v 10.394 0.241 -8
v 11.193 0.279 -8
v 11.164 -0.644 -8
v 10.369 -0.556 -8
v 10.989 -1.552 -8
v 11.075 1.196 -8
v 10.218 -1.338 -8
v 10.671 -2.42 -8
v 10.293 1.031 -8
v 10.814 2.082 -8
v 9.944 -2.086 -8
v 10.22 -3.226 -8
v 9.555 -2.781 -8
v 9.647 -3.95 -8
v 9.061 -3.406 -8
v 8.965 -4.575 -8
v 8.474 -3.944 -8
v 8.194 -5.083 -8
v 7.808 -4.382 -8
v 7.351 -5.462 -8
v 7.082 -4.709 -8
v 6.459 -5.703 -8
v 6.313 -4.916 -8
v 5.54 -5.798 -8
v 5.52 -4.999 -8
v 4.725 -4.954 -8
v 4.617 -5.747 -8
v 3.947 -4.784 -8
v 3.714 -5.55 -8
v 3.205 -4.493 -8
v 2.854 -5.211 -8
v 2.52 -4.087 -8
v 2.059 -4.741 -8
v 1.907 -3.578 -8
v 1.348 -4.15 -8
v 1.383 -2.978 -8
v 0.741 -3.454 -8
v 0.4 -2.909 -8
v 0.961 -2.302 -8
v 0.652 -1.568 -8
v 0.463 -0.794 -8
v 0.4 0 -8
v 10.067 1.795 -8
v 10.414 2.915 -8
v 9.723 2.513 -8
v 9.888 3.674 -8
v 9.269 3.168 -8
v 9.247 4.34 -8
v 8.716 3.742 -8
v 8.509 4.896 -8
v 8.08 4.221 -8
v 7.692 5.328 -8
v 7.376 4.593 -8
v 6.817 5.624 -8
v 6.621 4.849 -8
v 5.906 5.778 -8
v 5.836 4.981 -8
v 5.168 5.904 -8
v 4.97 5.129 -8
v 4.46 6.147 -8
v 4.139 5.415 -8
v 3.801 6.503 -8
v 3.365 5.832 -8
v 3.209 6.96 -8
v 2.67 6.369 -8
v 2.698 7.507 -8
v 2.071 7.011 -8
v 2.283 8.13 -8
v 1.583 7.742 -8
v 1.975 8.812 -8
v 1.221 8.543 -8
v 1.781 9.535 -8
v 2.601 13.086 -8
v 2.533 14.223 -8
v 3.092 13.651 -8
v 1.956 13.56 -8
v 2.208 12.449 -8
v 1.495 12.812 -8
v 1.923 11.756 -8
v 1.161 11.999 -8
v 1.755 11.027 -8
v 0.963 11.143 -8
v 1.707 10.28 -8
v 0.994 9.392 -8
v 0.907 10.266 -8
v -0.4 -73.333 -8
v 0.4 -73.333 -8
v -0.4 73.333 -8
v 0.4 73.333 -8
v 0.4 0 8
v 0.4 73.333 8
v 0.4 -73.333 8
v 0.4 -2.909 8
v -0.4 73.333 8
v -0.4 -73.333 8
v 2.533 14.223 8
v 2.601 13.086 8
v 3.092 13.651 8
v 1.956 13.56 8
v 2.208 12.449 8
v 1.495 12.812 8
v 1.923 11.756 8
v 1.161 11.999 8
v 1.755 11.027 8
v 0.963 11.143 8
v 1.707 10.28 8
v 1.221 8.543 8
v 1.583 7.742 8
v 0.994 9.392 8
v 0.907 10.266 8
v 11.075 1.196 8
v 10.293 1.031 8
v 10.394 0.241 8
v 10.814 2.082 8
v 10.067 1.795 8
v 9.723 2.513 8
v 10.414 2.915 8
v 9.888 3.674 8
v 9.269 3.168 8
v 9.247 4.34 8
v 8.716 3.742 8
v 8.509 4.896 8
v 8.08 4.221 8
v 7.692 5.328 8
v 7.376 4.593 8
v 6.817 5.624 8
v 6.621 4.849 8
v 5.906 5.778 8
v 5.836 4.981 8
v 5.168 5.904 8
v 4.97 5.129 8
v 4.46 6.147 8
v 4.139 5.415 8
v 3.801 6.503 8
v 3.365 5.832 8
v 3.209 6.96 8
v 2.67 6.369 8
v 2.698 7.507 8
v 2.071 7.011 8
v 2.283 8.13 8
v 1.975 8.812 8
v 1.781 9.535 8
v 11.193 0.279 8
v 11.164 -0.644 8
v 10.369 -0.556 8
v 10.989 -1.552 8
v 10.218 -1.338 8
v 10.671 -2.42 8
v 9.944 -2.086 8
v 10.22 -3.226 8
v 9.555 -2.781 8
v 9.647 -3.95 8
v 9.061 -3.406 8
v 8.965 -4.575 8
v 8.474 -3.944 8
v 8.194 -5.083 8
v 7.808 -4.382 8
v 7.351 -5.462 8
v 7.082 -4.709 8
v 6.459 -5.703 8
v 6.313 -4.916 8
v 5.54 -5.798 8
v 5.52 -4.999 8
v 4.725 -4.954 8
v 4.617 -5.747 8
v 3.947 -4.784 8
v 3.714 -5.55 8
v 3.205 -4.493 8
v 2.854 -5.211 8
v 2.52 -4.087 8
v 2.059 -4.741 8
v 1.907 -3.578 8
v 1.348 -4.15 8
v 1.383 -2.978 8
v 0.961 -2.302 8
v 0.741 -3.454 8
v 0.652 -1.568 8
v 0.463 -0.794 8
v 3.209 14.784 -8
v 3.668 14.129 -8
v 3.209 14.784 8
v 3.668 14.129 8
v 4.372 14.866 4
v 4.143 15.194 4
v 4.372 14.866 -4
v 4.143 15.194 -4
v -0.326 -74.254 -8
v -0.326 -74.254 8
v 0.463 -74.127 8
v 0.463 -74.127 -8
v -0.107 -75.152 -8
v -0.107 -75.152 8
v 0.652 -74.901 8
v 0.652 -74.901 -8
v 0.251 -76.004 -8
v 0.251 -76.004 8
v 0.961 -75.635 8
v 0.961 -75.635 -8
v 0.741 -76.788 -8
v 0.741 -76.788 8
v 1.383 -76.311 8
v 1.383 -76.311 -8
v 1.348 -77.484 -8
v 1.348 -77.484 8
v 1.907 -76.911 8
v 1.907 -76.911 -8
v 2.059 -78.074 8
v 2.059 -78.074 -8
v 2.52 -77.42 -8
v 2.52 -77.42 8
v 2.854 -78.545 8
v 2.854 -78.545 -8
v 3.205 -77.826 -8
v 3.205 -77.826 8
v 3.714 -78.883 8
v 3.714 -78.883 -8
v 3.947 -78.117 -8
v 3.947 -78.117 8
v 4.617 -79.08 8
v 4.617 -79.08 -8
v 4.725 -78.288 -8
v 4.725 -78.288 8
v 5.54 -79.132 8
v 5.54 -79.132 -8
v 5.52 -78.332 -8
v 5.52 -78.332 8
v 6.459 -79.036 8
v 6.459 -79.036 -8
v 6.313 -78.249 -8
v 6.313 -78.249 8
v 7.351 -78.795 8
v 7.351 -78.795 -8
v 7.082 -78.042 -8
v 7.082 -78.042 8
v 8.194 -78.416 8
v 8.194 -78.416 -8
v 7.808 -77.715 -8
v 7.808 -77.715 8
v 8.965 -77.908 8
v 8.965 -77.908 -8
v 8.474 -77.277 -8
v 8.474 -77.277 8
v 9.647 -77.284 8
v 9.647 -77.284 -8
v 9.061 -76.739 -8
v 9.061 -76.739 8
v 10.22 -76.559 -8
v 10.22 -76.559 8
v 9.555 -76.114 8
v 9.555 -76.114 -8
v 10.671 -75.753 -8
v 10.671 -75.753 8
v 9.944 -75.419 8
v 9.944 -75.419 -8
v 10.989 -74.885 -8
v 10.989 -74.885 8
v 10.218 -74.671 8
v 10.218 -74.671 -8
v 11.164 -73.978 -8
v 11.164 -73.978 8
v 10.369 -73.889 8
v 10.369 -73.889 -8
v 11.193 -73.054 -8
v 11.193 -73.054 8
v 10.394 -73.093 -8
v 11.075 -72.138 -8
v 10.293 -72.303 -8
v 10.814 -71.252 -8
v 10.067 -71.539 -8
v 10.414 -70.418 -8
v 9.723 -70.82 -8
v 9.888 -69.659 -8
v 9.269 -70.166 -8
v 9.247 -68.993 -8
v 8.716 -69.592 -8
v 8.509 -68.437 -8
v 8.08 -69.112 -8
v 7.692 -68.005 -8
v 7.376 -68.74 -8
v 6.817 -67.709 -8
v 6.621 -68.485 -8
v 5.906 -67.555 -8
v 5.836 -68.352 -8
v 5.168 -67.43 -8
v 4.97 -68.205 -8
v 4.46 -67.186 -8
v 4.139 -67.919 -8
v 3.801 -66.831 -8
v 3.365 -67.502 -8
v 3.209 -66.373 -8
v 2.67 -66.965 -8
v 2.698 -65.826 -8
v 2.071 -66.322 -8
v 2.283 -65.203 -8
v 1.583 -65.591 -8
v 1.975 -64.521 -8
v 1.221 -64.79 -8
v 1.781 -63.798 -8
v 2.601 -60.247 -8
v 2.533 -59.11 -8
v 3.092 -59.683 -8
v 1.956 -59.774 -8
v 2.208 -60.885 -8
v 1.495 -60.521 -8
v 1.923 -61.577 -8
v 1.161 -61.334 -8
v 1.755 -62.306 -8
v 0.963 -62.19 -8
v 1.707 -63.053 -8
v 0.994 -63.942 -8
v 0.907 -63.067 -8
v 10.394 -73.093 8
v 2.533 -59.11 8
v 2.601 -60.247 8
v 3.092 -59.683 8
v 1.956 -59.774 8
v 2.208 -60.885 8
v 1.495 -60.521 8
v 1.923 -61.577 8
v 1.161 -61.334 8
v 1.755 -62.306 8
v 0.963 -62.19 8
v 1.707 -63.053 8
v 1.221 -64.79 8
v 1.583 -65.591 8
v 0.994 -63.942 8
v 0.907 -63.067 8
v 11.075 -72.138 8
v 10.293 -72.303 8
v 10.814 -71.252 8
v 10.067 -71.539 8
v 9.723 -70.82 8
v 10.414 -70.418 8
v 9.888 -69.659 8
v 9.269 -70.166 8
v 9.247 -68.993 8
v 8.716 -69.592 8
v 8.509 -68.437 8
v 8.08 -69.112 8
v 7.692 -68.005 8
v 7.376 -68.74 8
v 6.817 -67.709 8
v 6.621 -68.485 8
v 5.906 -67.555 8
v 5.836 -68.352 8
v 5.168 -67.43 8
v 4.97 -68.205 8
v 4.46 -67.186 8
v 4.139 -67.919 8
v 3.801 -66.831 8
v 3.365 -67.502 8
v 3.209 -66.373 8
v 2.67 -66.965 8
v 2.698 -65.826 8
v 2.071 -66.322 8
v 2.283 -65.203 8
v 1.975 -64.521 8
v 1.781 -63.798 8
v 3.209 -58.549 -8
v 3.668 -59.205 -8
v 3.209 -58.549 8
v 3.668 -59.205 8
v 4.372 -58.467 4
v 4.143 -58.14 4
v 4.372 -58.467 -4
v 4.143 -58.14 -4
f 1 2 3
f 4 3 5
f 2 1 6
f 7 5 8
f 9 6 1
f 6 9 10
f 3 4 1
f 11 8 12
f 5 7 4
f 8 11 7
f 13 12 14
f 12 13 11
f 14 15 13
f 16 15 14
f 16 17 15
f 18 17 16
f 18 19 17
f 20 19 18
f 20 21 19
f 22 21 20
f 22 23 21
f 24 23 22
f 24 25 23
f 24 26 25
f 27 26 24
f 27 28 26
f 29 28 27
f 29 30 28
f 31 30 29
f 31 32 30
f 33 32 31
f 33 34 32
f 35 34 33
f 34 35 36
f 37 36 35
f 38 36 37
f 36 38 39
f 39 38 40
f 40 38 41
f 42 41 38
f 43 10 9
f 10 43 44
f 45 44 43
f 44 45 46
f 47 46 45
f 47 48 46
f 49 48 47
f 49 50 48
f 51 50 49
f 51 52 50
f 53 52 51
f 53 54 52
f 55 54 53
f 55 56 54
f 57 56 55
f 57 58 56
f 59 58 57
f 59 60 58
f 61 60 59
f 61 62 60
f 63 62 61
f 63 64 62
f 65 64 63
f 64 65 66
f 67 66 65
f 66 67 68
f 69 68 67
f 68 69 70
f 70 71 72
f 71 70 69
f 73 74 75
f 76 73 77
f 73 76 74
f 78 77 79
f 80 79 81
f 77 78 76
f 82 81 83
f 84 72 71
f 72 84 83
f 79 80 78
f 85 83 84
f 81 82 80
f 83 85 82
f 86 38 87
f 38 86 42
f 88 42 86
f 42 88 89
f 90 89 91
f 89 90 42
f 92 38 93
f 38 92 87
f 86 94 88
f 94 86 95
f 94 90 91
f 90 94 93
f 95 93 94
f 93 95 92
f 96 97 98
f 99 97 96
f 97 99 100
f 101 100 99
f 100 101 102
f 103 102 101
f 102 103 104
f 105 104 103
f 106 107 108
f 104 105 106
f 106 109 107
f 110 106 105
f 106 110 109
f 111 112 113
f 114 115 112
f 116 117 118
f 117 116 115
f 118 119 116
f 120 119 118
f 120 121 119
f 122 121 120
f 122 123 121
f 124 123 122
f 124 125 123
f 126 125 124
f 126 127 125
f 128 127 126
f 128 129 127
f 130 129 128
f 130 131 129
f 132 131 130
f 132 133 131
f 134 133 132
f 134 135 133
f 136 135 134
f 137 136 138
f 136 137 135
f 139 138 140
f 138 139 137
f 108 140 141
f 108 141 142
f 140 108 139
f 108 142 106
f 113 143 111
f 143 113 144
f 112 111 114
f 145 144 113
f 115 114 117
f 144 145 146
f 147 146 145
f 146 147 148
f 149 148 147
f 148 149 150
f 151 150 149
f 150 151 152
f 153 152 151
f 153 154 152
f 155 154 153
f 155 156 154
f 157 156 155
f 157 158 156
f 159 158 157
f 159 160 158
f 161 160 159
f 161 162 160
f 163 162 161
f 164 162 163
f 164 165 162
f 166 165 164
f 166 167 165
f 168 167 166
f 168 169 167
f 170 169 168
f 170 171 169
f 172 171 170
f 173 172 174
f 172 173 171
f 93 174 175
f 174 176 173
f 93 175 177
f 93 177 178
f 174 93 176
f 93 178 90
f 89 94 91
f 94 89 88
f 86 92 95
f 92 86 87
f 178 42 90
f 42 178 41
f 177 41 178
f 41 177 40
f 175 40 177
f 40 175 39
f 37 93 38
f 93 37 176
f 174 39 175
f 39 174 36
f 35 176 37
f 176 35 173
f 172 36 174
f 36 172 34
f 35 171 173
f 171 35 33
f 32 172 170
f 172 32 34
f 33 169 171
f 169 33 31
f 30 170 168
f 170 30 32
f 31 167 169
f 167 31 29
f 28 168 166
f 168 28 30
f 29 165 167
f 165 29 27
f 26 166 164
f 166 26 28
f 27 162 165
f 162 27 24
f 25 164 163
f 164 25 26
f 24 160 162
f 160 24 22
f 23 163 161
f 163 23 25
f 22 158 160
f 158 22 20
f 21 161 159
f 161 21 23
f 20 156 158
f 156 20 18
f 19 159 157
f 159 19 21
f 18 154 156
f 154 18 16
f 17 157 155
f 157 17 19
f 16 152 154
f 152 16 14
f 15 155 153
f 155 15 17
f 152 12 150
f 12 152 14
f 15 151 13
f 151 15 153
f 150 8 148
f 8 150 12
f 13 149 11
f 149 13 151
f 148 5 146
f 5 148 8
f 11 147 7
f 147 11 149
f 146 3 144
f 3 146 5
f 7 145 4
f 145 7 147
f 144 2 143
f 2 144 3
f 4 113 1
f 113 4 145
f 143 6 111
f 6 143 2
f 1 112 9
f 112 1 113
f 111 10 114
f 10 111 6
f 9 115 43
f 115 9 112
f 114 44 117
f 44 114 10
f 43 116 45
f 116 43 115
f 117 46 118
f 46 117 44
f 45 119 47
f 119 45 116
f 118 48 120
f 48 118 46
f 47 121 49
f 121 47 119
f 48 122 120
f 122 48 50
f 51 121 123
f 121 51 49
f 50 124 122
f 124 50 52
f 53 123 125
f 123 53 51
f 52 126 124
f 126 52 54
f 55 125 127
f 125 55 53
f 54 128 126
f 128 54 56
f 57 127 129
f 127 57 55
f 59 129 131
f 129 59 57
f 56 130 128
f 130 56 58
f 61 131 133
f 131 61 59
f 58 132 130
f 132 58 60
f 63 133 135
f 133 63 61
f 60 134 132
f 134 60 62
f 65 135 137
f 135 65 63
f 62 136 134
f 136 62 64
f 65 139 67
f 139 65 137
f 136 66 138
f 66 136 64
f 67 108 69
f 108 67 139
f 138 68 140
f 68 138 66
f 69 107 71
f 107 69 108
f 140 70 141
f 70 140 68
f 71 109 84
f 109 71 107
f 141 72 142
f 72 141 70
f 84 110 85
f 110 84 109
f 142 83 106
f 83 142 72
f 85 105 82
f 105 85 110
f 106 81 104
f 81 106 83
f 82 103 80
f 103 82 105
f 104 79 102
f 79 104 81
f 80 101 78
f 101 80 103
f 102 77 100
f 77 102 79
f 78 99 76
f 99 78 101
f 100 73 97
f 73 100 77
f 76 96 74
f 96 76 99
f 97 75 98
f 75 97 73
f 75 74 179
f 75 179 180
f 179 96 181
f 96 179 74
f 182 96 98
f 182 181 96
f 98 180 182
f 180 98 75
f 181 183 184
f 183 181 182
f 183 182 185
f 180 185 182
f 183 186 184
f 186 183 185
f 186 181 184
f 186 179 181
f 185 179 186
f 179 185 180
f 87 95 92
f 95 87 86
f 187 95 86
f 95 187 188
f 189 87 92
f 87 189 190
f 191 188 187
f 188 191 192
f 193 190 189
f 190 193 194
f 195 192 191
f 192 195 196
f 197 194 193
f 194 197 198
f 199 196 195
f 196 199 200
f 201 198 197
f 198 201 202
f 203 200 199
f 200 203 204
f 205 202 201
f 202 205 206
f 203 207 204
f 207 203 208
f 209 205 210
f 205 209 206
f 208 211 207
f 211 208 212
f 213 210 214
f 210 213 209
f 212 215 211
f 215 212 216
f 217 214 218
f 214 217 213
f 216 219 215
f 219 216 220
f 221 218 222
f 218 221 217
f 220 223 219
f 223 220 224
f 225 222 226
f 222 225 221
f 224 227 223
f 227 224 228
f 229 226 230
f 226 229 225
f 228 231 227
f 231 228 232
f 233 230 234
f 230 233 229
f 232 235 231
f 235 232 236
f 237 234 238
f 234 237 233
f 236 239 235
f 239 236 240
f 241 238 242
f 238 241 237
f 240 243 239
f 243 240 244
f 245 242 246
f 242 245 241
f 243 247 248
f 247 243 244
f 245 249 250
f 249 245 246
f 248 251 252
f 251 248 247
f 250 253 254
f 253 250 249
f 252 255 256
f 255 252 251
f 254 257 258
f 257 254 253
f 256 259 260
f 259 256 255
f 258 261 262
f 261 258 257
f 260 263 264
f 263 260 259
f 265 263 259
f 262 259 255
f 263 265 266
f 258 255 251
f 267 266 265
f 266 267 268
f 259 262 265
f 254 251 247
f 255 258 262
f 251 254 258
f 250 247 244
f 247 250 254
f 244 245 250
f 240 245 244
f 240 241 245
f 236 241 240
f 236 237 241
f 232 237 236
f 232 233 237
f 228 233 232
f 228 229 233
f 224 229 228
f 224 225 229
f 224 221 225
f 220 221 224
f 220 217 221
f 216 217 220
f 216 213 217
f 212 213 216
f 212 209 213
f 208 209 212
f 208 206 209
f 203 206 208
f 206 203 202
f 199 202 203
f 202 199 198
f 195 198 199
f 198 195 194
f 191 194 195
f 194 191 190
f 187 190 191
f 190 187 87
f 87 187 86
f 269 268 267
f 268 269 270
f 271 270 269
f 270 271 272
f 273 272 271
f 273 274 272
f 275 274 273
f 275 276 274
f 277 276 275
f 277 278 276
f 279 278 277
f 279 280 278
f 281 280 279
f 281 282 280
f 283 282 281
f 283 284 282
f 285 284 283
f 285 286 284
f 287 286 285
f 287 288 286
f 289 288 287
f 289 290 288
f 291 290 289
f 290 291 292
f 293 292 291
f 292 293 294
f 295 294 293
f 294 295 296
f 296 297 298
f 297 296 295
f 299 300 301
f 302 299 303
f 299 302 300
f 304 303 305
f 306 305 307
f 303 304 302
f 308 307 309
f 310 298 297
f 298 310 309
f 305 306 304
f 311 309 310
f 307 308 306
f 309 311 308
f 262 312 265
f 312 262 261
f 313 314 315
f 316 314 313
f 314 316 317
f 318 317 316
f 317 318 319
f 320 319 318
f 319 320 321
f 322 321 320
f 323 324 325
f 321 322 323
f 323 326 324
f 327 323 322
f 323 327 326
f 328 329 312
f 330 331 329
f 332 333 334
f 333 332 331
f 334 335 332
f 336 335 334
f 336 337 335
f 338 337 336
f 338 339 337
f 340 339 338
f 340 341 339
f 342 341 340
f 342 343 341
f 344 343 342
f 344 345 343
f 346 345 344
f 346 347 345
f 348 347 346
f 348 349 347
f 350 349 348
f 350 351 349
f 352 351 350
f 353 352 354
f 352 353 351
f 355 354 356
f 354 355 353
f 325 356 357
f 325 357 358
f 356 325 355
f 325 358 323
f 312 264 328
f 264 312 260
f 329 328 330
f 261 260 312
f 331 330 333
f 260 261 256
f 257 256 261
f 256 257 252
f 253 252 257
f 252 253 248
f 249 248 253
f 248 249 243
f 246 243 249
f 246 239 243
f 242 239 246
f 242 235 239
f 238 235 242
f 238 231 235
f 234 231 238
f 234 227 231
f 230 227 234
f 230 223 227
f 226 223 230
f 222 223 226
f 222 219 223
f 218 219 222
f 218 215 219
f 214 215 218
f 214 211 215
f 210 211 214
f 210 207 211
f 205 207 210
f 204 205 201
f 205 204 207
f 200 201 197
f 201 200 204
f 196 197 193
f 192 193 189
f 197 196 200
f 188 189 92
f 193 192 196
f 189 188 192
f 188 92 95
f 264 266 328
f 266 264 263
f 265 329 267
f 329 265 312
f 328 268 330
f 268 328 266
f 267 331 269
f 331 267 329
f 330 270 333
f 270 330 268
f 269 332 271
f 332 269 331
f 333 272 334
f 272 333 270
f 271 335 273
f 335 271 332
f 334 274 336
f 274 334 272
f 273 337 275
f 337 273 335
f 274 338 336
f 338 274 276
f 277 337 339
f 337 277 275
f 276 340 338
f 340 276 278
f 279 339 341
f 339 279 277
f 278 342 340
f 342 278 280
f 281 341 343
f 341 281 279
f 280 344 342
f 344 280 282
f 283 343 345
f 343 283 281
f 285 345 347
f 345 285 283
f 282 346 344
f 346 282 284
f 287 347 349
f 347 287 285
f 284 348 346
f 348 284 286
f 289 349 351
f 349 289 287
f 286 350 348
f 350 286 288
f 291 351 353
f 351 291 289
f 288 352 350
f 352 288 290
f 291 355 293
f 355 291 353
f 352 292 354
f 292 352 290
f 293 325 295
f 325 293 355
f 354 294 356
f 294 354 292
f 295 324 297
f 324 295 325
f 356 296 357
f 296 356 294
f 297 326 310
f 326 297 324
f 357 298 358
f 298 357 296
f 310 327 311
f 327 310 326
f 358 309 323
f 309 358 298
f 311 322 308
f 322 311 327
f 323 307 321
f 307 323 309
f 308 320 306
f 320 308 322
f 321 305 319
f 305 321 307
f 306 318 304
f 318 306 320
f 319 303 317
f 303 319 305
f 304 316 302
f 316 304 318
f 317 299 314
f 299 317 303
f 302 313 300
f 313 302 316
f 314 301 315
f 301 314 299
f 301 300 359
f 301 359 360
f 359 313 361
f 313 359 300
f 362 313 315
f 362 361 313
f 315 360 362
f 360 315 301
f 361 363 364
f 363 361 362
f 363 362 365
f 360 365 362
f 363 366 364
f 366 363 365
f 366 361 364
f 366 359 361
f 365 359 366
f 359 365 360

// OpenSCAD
$fn = 40;




letter_width = 220;
letter_height = 110;
letter_thickness = 5;

letter_slot_count = 2;

/* [Command Strip] */

// Command Strip Width
commandstrip_w = 16; // 16mm width strip, but cut in half

// Command Strip Height (Not including the pull tab)
commandstrip_h = 50;

// Command Strip Thickness
commandstrip_thickness = 1.0;

/* model spec */
spring_curve_thickness = 0.8;

module hookHalfCurve(
    majorcurve_radius = 5, 
    flange_radius = 5,
    majorcurve_angle = 265, 
    flange_angle = 140,  
    curve_thickness = 1,
    curve_height=10)
{
    module hookCrossSection()
    {
        square(size = [curve_thickness, curve_height], center = true);
    }
    translate([-majorcurve_radius,0,0])
        union()
        {
            // Major Curve
            rotate_extrude(angle = majorcurve_angle) 
                translate([majorcurve_radius+curve_thickness/2, 0, 0])
                    hookCrossSection();
            // Mini Curve
            rotate([0,0,-180+majorcurve_angle])
            translate([-majorcurve_radius-flange_radius-curve_thickness/2,0,0])
            rotate_extrude(angle = -flange_angle) 
                translate([flange_radius, 0, 0])        
                    hookCrossSection();
            // Mini Curve Cap
            rotate([0,0,-180+majorcurve_angle])
            translate([-majorcurve_radius-flange_radius-curve_thickness/2,0,0])
                rotate([0,0,-flange_angle])
                    translate([flange_radius, 0, 0])
                        rotate([90,0,0])
                            linear_extrude(height=1, scale=0.5)
                                hookCrossSection();
        }  
}

rotate([0,90,0])
{
    // Letter Model
    if (1)
    for (i=[0:1:letter_slot_count-1])
        translate([0,-i*(letter_height*2/3),0])
            rotate([10,0,0])
                translate([0,letter_height/2,letter_thickness/2])
                    %cube([letter_width, letter_height, letter_thickness], center=true);

    // Base
    base_thickness = 0.8;
    //hull()
    {
        for (i=[0:1:letter_slot_count-1])
            translate([0,-i*(letter_height*2/3),0])
                translate([0,letter_height*1/3,0])
                    cube([commandstrip_w, letter_height*2/3, base_thickness], center=true);
    }

    for (i=[0:1:letter_slot_count-1])
        translate([0,-i*(letter_height*2/3),spring_curve_thickness/2])
                rotate([180,90,0])
                    hookHalfCurve(curve_thickness=spring_curve_thickness, curve_height=commandstrip_w);
}
